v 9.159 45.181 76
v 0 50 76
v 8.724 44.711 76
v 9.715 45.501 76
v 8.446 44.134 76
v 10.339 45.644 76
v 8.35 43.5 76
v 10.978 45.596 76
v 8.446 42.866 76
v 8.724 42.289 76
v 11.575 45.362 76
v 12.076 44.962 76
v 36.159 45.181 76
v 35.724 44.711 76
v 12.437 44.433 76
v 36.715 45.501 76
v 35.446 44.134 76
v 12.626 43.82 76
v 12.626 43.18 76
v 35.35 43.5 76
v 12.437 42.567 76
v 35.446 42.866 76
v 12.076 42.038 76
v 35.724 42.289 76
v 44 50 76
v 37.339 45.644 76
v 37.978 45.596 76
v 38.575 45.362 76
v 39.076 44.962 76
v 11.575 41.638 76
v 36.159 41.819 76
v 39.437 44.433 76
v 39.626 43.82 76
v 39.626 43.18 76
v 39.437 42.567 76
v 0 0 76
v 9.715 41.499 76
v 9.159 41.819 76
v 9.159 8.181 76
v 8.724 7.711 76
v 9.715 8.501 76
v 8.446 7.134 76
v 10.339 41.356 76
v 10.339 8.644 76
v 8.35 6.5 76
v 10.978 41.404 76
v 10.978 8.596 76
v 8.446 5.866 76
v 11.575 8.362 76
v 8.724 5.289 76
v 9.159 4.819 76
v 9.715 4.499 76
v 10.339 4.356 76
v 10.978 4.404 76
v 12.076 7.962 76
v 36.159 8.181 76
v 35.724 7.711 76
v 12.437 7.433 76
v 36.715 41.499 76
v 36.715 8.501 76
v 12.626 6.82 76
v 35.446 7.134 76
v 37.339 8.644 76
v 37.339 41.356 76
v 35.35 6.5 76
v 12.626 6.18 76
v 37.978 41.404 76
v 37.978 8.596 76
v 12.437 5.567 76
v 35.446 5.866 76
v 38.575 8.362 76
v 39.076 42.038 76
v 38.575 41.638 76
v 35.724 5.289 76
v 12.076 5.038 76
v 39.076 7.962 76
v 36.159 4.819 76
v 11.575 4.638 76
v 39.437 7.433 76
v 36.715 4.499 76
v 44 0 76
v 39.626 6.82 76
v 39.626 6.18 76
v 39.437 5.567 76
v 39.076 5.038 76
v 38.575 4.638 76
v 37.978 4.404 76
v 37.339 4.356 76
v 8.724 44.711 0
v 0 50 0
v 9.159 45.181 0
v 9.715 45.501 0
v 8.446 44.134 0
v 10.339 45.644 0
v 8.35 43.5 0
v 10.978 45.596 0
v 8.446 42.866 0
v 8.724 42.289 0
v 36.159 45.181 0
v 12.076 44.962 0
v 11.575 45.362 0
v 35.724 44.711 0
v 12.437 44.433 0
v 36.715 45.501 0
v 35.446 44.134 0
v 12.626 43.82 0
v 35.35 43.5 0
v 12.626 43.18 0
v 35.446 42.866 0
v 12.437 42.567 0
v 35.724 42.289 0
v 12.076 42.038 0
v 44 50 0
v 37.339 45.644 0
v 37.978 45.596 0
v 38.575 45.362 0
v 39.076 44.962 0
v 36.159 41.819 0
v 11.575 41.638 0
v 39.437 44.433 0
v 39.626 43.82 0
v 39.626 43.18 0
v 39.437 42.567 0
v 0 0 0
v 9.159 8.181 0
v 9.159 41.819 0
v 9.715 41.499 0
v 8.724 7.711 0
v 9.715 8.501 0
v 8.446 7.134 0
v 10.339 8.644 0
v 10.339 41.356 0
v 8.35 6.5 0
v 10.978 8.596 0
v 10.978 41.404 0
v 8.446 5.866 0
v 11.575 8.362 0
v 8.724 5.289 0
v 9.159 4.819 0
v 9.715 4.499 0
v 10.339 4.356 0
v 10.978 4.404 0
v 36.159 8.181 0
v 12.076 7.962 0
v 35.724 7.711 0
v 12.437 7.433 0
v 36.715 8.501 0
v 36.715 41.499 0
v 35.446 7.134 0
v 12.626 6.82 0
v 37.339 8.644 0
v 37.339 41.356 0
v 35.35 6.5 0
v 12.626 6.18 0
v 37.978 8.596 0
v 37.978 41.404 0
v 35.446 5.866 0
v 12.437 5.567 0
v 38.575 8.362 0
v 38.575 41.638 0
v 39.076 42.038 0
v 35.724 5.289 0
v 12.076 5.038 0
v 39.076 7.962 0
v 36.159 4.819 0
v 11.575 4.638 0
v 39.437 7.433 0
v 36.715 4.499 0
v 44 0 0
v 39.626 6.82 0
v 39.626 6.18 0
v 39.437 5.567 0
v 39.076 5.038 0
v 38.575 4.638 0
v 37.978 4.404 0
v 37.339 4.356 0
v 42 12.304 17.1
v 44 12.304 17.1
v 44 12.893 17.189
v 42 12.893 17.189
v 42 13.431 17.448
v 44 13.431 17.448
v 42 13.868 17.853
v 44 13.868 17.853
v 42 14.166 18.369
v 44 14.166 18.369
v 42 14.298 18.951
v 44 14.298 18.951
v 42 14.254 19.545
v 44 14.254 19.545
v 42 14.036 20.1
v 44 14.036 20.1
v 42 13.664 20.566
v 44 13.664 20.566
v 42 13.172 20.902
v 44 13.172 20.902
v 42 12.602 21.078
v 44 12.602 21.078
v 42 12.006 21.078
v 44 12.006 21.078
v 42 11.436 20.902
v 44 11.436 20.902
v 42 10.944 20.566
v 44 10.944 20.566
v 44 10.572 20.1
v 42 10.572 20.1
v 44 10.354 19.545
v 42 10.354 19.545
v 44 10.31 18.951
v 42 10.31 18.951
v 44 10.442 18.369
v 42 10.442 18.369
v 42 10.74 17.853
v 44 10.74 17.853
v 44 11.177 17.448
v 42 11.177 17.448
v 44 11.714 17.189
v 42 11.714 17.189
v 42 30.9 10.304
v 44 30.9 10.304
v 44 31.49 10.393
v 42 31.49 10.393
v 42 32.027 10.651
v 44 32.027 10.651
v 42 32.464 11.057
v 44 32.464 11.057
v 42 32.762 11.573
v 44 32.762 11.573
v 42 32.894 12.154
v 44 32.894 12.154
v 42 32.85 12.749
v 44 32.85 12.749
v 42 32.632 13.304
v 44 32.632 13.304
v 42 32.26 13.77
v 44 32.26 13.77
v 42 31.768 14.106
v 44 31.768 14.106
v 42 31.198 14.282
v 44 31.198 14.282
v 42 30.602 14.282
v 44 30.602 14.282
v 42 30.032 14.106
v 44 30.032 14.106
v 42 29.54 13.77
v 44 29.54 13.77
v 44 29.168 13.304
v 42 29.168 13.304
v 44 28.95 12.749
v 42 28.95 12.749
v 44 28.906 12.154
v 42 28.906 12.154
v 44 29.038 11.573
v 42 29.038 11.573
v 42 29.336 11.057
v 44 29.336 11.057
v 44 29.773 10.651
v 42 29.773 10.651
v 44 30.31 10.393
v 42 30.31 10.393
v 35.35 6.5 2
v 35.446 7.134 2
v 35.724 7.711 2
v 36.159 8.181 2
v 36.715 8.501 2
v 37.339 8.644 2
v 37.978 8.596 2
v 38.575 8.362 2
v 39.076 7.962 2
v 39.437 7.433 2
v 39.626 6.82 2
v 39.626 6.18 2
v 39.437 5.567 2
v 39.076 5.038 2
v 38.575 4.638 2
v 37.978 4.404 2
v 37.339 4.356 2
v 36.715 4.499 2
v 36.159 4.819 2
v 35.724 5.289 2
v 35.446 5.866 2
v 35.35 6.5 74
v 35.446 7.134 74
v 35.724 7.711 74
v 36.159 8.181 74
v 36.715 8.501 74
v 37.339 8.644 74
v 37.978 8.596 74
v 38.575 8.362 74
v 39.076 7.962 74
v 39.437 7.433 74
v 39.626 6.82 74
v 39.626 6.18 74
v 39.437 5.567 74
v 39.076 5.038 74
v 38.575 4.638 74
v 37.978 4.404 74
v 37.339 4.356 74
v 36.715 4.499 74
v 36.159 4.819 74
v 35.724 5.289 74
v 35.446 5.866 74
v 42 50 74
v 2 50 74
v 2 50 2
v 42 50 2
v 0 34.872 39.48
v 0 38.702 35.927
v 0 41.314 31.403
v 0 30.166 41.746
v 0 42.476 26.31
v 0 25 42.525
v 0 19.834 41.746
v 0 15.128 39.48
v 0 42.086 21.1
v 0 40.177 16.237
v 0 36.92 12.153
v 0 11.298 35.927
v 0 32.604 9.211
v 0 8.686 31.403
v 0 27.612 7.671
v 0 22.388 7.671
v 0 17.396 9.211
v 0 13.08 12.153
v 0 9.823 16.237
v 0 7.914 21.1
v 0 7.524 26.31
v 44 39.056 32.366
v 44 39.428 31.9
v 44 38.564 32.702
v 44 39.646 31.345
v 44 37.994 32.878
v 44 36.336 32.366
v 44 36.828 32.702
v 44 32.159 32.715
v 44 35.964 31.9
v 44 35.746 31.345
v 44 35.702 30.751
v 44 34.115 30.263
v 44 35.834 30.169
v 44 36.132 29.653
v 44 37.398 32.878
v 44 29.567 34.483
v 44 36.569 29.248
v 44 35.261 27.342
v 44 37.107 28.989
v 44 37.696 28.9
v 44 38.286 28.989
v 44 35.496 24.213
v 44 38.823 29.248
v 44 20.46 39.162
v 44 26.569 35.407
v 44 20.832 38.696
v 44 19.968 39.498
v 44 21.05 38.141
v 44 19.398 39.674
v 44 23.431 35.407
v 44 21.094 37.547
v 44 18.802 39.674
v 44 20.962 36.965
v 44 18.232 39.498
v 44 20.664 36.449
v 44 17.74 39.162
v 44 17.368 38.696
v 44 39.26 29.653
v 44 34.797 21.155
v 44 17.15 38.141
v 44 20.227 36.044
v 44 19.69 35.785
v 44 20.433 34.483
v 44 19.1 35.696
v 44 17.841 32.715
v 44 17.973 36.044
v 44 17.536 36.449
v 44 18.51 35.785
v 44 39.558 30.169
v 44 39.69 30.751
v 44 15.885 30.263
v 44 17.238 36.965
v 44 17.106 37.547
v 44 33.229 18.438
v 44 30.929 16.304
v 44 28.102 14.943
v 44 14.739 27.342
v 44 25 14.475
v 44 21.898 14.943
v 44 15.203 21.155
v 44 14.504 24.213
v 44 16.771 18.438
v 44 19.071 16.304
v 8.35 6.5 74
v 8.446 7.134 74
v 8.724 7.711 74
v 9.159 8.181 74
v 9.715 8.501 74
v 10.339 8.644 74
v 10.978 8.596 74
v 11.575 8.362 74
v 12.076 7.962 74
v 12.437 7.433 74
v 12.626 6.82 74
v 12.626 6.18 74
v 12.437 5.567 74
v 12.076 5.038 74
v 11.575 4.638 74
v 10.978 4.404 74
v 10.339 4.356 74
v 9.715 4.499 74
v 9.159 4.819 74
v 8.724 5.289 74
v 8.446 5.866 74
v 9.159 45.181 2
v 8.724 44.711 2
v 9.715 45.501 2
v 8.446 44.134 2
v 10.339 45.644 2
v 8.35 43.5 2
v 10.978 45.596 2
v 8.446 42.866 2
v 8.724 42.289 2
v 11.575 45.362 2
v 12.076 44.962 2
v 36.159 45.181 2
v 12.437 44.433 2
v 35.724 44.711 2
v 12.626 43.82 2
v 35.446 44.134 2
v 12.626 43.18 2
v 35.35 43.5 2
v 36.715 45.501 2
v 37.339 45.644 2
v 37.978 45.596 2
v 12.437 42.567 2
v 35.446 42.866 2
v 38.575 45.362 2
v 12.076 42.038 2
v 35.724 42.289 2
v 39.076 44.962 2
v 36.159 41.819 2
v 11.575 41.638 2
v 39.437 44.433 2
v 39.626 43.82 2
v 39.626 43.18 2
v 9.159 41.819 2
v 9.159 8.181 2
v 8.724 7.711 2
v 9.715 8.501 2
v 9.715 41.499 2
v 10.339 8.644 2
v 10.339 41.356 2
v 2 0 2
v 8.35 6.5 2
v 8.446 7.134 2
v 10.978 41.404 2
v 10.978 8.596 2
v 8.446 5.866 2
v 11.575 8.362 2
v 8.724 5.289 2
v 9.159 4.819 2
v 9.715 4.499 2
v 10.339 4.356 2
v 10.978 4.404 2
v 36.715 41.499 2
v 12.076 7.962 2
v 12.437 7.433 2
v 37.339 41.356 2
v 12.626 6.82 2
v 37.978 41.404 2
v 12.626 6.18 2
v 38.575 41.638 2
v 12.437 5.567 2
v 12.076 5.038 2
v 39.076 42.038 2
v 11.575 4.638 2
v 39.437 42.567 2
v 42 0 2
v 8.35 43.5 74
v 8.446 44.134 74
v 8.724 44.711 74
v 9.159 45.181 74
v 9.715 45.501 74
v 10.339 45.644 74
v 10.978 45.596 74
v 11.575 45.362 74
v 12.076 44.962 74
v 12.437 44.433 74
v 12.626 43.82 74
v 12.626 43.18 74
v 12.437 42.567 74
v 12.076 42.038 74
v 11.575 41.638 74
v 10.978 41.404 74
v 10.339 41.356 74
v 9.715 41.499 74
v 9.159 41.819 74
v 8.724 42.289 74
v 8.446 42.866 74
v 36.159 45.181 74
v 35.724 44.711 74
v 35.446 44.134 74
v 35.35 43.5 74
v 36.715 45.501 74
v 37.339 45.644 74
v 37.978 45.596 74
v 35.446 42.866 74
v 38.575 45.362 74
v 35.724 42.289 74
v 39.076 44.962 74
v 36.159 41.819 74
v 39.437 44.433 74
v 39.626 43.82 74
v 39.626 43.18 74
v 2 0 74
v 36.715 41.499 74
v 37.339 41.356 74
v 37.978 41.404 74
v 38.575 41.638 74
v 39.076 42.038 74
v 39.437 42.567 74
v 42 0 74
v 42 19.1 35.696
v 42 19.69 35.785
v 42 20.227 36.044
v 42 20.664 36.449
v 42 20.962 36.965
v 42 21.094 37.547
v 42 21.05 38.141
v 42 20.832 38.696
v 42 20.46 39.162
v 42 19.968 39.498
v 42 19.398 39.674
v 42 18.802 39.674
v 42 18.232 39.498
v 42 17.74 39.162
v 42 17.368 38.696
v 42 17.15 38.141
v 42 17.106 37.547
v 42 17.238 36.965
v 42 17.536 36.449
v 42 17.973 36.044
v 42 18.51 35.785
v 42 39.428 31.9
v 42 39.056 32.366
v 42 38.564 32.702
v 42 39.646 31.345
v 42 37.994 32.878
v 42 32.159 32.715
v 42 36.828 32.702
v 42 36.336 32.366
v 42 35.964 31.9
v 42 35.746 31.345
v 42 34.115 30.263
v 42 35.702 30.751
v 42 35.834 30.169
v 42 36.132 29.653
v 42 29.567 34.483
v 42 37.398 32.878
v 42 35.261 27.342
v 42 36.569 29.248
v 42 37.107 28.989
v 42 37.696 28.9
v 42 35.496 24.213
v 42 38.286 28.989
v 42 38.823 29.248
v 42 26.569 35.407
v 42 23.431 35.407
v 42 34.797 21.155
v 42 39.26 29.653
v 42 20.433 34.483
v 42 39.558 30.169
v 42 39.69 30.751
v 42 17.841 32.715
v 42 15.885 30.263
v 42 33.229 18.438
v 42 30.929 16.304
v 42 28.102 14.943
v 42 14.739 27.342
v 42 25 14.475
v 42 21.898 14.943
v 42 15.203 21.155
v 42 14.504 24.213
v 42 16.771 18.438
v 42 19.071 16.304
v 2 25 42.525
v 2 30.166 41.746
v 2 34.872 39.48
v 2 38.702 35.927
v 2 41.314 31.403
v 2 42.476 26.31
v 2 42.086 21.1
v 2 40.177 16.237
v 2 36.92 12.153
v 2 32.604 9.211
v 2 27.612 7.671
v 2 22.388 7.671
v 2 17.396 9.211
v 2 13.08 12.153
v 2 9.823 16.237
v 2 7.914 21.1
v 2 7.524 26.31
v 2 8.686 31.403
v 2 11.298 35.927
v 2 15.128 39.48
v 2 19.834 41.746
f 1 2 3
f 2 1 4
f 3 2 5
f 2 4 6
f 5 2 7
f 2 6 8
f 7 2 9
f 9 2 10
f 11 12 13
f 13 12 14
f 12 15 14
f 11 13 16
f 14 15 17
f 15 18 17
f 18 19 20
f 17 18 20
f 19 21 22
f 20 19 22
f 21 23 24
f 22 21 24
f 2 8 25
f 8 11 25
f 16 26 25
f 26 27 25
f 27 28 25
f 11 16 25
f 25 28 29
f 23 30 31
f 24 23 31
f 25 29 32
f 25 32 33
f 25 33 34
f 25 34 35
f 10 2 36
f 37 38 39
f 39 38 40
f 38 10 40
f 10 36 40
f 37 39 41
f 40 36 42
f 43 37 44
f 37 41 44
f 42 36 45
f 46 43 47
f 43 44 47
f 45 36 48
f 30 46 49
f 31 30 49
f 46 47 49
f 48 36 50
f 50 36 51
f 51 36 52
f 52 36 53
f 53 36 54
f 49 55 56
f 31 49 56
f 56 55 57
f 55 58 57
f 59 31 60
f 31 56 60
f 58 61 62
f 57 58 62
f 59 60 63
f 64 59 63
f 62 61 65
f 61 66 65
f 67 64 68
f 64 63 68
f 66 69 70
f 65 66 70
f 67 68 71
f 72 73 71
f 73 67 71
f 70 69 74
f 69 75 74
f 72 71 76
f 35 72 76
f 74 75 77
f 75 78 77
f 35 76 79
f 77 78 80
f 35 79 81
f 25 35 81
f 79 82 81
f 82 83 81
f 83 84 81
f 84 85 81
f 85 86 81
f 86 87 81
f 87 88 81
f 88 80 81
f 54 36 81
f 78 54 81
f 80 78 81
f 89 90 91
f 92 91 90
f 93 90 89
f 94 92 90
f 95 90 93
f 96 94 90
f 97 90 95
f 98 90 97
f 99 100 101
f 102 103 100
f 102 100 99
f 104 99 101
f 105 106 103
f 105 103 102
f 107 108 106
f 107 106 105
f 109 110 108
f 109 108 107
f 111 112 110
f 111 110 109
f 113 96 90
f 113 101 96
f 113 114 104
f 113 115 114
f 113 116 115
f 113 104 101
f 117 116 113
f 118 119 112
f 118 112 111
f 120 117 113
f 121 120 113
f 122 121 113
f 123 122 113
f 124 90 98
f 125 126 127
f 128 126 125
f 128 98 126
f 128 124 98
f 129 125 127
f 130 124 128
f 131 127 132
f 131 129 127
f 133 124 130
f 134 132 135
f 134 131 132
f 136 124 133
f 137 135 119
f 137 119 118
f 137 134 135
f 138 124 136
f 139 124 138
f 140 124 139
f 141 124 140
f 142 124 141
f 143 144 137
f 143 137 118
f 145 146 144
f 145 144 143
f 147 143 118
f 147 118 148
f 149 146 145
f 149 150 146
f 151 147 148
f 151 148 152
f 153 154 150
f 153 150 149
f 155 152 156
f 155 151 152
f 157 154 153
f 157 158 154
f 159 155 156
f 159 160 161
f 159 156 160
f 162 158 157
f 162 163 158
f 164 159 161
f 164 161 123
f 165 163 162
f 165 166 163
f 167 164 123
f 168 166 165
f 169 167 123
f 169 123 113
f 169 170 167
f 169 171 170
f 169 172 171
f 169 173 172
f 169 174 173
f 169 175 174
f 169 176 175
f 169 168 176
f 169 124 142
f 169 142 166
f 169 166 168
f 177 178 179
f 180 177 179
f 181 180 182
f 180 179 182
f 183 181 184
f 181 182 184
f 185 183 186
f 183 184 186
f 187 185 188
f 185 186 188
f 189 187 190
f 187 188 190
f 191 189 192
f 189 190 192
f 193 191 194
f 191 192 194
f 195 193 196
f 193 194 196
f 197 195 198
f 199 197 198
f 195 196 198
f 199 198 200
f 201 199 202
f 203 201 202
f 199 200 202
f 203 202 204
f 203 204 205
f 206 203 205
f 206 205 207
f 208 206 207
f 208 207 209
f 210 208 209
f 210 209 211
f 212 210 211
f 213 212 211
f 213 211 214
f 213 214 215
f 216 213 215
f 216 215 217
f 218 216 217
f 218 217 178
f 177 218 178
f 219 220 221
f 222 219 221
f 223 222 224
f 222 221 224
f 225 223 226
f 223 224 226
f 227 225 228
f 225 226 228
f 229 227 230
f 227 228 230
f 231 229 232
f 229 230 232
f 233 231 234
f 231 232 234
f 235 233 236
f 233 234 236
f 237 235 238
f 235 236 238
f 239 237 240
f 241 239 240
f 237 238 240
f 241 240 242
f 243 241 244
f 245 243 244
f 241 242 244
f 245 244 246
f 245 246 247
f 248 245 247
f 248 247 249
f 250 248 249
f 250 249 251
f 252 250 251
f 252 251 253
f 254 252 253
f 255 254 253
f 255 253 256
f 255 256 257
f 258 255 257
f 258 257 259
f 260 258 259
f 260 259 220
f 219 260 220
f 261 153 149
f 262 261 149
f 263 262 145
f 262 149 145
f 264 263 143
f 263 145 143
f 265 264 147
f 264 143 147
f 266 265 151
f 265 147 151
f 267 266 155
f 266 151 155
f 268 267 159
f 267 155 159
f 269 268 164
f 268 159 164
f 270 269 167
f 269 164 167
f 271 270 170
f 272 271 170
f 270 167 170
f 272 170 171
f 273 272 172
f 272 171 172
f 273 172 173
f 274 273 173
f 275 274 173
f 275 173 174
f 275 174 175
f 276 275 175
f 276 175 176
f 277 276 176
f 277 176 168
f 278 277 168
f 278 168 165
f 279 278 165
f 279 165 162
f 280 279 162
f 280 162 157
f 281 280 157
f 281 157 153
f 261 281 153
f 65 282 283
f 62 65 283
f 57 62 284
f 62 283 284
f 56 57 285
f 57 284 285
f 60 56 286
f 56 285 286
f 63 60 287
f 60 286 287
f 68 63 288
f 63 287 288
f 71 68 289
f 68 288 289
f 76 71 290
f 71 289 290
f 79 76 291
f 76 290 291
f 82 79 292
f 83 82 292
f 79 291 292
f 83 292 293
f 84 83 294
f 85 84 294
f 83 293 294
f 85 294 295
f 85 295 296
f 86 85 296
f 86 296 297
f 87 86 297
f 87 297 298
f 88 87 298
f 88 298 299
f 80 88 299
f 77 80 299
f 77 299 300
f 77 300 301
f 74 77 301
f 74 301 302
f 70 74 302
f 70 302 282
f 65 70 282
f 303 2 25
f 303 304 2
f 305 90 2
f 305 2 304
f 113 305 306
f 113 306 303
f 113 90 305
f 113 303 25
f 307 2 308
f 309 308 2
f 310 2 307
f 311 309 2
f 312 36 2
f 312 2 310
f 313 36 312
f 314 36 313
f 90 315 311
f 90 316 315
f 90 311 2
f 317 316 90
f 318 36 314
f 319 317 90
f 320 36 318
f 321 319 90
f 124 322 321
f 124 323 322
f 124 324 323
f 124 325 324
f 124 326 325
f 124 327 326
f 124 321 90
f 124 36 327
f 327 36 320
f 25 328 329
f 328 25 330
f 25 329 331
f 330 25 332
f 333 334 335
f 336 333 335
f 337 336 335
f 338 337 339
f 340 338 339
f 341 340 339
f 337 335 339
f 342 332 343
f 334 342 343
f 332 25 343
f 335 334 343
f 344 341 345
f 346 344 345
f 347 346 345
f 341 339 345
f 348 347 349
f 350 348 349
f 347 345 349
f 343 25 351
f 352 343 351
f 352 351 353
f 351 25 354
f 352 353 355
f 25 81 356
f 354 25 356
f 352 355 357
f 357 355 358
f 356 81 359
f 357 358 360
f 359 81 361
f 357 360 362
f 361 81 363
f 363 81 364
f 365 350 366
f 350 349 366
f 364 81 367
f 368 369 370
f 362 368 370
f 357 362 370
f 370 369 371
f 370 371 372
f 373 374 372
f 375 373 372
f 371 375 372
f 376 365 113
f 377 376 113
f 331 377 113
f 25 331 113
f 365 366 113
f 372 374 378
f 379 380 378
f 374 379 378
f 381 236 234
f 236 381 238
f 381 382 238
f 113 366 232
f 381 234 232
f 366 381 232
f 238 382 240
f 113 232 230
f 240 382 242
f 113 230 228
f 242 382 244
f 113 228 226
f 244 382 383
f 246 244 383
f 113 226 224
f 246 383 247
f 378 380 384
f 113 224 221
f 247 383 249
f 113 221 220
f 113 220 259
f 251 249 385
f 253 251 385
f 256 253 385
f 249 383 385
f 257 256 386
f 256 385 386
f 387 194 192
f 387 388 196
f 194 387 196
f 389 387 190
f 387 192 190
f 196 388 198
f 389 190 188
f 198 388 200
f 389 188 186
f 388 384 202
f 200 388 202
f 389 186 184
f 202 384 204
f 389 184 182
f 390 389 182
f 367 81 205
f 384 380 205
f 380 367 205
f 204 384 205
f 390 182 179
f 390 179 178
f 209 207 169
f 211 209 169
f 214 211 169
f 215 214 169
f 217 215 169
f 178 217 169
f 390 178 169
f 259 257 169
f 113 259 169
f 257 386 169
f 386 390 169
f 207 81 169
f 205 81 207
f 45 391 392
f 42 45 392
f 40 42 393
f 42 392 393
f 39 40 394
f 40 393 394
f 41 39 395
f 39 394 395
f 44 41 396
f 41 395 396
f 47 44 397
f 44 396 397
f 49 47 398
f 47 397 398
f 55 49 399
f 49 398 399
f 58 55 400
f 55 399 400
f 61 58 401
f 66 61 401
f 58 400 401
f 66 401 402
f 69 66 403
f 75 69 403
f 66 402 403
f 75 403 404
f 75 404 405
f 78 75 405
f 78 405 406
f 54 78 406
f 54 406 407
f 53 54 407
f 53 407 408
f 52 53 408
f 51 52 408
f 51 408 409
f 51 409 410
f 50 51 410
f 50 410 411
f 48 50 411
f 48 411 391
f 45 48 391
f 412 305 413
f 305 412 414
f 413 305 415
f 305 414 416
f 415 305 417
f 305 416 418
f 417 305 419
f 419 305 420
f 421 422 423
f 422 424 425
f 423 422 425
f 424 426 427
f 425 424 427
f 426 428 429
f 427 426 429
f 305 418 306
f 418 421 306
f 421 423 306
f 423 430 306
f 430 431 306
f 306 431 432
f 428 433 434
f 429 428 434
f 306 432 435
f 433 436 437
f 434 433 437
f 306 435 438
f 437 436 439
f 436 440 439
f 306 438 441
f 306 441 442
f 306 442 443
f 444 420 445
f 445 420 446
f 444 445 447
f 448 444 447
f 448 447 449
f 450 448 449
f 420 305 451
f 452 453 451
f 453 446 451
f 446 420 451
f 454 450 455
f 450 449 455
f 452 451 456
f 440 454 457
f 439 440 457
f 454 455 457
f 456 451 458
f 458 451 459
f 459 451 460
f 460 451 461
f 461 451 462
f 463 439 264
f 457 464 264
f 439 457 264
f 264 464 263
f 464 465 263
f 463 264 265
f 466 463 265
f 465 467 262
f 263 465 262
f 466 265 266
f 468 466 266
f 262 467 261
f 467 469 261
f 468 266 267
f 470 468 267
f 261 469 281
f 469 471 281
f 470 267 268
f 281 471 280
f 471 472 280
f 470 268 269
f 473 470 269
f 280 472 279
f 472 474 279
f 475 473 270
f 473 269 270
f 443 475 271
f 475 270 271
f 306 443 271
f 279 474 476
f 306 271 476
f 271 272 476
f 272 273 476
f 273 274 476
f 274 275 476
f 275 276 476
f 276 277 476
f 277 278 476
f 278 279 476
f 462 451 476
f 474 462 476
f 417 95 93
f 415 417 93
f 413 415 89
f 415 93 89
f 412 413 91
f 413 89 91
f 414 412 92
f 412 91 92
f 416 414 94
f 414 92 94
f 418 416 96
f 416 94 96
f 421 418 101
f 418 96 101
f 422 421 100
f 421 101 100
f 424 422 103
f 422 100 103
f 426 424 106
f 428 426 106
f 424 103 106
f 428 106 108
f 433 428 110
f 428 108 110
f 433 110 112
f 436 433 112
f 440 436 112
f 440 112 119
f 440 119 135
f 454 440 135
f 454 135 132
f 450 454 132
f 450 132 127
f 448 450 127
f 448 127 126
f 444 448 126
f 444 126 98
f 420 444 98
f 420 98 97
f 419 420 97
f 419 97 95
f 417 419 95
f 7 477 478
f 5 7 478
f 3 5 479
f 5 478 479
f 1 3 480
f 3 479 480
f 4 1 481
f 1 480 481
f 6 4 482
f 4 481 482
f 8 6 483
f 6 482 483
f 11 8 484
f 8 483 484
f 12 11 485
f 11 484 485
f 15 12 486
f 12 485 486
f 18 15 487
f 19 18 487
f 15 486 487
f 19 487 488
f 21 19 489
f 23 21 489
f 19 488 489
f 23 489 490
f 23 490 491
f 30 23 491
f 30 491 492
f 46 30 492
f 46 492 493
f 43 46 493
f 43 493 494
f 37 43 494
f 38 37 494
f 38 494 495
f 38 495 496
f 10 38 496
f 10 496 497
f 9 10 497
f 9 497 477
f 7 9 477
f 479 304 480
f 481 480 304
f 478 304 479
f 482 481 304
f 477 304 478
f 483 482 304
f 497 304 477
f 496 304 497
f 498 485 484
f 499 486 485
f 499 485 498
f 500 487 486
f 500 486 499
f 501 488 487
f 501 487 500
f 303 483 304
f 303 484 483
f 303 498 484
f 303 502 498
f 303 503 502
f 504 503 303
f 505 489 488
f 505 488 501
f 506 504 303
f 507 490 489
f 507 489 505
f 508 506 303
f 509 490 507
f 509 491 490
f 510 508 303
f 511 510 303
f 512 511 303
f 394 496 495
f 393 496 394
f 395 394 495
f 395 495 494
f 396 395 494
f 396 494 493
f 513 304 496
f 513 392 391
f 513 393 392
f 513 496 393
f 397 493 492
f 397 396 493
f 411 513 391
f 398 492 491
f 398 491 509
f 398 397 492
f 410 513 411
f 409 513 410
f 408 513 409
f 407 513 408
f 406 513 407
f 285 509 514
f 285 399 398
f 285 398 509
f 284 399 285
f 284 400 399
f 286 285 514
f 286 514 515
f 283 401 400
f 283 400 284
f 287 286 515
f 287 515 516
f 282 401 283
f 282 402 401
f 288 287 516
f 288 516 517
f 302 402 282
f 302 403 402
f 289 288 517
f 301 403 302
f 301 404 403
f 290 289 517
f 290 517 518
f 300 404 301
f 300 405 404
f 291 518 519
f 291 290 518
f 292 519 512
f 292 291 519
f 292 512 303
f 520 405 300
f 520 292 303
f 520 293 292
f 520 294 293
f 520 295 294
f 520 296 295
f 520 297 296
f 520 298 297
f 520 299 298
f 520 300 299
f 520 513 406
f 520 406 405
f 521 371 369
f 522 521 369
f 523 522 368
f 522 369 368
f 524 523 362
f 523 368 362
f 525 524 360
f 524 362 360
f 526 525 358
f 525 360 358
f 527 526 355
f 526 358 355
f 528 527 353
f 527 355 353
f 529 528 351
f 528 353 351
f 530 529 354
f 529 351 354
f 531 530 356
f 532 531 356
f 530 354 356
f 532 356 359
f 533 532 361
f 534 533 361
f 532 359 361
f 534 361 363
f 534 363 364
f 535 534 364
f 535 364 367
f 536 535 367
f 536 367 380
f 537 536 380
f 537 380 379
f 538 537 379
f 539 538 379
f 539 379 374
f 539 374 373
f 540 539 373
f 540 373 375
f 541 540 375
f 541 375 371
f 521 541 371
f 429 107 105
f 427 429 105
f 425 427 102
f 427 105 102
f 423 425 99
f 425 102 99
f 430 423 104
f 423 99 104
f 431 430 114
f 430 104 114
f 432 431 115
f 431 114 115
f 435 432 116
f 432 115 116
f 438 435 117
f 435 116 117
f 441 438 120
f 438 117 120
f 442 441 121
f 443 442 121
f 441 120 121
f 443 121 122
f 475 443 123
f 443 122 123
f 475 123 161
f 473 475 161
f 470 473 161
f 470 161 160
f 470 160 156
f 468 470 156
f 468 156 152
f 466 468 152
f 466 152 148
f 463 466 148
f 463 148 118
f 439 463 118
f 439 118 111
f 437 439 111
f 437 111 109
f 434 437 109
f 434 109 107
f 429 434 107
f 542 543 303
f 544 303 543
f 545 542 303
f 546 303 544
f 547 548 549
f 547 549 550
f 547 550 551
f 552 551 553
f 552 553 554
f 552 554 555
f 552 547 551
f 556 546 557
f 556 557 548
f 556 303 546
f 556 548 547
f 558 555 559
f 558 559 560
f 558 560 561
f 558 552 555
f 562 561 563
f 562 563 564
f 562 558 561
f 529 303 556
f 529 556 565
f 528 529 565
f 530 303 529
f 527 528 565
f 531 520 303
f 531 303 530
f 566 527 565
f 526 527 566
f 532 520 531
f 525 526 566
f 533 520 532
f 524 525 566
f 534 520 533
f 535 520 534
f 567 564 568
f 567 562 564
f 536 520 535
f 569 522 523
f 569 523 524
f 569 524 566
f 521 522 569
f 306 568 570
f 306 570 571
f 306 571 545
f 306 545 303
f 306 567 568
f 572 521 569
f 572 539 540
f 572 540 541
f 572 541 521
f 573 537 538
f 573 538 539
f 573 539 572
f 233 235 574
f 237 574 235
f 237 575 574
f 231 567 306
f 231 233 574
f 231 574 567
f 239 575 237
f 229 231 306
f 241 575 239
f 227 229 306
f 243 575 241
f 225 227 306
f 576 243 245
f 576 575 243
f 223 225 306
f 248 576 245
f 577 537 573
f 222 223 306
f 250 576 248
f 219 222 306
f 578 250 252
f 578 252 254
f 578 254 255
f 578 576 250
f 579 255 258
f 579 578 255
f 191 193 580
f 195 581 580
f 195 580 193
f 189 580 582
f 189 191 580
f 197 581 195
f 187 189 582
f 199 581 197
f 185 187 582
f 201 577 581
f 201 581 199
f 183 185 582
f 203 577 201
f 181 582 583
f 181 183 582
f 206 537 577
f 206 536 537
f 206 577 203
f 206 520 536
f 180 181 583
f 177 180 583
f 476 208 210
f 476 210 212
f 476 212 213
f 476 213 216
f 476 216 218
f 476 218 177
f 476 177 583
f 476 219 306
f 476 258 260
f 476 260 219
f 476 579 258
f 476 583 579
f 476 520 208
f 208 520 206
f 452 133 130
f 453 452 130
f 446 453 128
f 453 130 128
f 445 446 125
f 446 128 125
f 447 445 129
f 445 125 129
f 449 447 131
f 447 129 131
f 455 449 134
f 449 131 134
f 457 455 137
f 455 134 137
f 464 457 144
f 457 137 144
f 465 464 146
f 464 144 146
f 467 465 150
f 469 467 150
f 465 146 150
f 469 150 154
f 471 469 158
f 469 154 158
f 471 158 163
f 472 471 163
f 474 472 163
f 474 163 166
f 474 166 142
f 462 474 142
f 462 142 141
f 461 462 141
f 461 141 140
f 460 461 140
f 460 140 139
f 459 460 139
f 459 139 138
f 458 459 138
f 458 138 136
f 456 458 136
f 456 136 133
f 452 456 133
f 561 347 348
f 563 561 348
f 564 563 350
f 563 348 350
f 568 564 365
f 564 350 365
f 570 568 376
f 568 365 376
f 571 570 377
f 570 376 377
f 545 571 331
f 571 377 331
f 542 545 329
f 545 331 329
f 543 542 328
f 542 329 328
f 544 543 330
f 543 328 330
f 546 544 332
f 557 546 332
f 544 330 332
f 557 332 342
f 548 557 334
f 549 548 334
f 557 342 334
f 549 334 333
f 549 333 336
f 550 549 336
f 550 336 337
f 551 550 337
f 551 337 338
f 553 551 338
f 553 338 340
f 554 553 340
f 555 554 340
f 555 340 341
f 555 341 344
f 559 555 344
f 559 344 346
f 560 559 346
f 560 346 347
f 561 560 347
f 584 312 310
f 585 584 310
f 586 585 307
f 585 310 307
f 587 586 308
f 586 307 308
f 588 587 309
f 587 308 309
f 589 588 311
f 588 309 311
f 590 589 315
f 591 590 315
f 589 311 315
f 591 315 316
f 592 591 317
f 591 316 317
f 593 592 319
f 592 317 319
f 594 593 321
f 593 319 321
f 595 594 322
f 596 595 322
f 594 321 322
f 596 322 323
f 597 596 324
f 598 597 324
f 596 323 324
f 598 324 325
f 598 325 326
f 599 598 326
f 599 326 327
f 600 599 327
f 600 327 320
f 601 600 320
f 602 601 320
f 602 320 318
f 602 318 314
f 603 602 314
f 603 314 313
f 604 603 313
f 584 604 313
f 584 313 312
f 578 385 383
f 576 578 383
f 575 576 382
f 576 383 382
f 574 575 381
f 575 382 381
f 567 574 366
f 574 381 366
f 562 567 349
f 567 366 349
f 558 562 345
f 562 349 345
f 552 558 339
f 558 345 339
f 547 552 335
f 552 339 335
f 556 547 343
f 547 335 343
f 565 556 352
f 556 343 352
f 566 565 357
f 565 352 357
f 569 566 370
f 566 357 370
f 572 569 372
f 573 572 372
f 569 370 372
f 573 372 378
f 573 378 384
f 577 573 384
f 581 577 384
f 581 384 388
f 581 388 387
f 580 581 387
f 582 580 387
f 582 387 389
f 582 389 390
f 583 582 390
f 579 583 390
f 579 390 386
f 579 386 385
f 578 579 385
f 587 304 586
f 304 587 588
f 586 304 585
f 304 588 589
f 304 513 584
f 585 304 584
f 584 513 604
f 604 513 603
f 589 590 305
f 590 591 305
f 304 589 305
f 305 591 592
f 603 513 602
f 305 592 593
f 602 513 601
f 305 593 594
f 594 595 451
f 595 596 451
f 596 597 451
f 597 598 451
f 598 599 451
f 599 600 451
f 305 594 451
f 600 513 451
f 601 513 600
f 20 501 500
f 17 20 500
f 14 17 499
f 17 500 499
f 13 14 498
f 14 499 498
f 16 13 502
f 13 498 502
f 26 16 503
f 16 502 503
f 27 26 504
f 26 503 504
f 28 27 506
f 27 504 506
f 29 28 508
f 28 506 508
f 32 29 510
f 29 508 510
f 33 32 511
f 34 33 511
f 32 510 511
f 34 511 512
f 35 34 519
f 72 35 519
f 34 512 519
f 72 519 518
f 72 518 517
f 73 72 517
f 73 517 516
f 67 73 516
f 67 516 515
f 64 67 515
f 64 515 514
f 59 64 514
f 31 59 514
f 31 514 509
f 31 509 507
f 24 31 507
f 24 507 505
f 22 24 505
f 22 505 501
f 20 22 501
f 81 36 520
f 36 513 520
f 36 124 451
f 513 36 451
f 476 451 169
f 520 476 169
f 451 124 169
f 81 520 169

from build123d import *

# Parameters (mm, degrees)
SKETCH_1_W          = 44
SKETCH_1_H          = 76
SKETCH_1_W_2        = 40
SKETCH_1_H_2        = 72
EXTRUDE_1_DEPTH     = 50
SKETCH_2_R          = 2.15
CUT_EXTRUDE_1_DEPTH = 102.054440773
CUT_EXTRUDE_2_REACH = 103.054
SKETCH_3_R          = 17.525
CUT_EXTRUDE_3_REACH = 103.054
SKETCH_4_R          = 10.525
SKETCH_12_R         = 2
CUT_EXTRUDE_7_DEPTH = 10


with BuildPart() as part:
    # 草图1 → 凸台-拉伸1 (new body)
    with BuildSketch(Plane(origin=(0, 0, 0), x_dir=(1, 0, 0), z_dir=(0, 1, 0))):
        with Locations((22, -38)):
            Rectangle(SKETCH_1_W, SKETCH_1_H)
        with Locations((22, -38)):
            Rectangle(SKETCH_1_W_2, SKETCH_1_H_2, mode=Mode.SUBTRACT)
    extrude(amount=EXTRUDE_1_DEPTH)

    # 草图2 → 切除-拉伸1 (cut, through all)
    with BuildSketch(Plane(origin=(0, 0, 0), x_dir=(-1, 0, 0), z_dir=(0, 0, -1))):
        with Locations((-10.5, 6.5)):
            Circle(SKETCH_2_R)
        with Locations((-37.5, 6.5)):
            Circle(SKETCH_2_R)
        with Locations((-37.5, 43.5)):
            Circle(SKETCH_2_R)
        with Locations((-10.5, 43.5)):
            Circle(SKETCH_2_R)
    extrude(amount=-CUT_EXTRUDE_1_DEPTH, mode=Mode.SUBTRACT)

    # 草图3 → Cut-Extrude 2 (cut, up to next)
    with BuildSketch(Plane.ZY, mode=Mode.PRIVATE) as cut_extrude_2_sk1:
        with Locations((25, 25)):
            Circle(SKETCH_3_R)
    cut_extrude_2_tool1 = extrude(cut_extrude_2_sk1.sketch, amount=-CUT_EXTRUDE_2_REACH, mode=Mode.PRIVATE) & part.part
    add(cut_extrude_2_tool1.solids().sort_by_distance((0, 25, 25))[0], mode=Mode.SUBTRACT)

    # 草图4 → Cut-Extrude 3 (cut, up to next)
    with BuildSketch(Plane(origin=(44, 0, 0), x_dir=(0, 0, -1), z_dir=(1, 0, 0)), mode=Mode.PRIVATE) as cut_extrude_3_sk1:
        with Locations((-25, 25)):
            Circle(SKETCH_4_R)
    cut_extrude_3_tool1 = extrude(cut_extrude_3_sk1.sketch, amount=-CUT_EXTRUDE_3_REACH, mode=Mode.PRIVATE) & part.part
    add(cut_extrude_3_tool1.solids().sort_by_distance((44, 25, 25))[0], mode=Mode.SUBTRACT)

    # 草图12 → 电机7号 (cut)
    with BuildSketch(Plane(origin=(44, 0, 0), x_dir=(0, 0, -1), z_dir=(1, 0, 0))):
        with Locations((-12.303937618, 30.9)):
            Circle(SKETCH_12_R)
        with Locations((-19.1, 12.303937618)):
            Circle(SKETCH_12_R)
        with Locations((-37.696062382, 19.1)):
            Circle(SKETCH_12_R)
        with Locations((-30.9, 37.696062382)):
            Circle(SKETCH_12_R)
    extrude(amount=-CUT_EXTRUDE_7_DEPTH, mode=Mode.SUBTRACT)


solid = part.part
